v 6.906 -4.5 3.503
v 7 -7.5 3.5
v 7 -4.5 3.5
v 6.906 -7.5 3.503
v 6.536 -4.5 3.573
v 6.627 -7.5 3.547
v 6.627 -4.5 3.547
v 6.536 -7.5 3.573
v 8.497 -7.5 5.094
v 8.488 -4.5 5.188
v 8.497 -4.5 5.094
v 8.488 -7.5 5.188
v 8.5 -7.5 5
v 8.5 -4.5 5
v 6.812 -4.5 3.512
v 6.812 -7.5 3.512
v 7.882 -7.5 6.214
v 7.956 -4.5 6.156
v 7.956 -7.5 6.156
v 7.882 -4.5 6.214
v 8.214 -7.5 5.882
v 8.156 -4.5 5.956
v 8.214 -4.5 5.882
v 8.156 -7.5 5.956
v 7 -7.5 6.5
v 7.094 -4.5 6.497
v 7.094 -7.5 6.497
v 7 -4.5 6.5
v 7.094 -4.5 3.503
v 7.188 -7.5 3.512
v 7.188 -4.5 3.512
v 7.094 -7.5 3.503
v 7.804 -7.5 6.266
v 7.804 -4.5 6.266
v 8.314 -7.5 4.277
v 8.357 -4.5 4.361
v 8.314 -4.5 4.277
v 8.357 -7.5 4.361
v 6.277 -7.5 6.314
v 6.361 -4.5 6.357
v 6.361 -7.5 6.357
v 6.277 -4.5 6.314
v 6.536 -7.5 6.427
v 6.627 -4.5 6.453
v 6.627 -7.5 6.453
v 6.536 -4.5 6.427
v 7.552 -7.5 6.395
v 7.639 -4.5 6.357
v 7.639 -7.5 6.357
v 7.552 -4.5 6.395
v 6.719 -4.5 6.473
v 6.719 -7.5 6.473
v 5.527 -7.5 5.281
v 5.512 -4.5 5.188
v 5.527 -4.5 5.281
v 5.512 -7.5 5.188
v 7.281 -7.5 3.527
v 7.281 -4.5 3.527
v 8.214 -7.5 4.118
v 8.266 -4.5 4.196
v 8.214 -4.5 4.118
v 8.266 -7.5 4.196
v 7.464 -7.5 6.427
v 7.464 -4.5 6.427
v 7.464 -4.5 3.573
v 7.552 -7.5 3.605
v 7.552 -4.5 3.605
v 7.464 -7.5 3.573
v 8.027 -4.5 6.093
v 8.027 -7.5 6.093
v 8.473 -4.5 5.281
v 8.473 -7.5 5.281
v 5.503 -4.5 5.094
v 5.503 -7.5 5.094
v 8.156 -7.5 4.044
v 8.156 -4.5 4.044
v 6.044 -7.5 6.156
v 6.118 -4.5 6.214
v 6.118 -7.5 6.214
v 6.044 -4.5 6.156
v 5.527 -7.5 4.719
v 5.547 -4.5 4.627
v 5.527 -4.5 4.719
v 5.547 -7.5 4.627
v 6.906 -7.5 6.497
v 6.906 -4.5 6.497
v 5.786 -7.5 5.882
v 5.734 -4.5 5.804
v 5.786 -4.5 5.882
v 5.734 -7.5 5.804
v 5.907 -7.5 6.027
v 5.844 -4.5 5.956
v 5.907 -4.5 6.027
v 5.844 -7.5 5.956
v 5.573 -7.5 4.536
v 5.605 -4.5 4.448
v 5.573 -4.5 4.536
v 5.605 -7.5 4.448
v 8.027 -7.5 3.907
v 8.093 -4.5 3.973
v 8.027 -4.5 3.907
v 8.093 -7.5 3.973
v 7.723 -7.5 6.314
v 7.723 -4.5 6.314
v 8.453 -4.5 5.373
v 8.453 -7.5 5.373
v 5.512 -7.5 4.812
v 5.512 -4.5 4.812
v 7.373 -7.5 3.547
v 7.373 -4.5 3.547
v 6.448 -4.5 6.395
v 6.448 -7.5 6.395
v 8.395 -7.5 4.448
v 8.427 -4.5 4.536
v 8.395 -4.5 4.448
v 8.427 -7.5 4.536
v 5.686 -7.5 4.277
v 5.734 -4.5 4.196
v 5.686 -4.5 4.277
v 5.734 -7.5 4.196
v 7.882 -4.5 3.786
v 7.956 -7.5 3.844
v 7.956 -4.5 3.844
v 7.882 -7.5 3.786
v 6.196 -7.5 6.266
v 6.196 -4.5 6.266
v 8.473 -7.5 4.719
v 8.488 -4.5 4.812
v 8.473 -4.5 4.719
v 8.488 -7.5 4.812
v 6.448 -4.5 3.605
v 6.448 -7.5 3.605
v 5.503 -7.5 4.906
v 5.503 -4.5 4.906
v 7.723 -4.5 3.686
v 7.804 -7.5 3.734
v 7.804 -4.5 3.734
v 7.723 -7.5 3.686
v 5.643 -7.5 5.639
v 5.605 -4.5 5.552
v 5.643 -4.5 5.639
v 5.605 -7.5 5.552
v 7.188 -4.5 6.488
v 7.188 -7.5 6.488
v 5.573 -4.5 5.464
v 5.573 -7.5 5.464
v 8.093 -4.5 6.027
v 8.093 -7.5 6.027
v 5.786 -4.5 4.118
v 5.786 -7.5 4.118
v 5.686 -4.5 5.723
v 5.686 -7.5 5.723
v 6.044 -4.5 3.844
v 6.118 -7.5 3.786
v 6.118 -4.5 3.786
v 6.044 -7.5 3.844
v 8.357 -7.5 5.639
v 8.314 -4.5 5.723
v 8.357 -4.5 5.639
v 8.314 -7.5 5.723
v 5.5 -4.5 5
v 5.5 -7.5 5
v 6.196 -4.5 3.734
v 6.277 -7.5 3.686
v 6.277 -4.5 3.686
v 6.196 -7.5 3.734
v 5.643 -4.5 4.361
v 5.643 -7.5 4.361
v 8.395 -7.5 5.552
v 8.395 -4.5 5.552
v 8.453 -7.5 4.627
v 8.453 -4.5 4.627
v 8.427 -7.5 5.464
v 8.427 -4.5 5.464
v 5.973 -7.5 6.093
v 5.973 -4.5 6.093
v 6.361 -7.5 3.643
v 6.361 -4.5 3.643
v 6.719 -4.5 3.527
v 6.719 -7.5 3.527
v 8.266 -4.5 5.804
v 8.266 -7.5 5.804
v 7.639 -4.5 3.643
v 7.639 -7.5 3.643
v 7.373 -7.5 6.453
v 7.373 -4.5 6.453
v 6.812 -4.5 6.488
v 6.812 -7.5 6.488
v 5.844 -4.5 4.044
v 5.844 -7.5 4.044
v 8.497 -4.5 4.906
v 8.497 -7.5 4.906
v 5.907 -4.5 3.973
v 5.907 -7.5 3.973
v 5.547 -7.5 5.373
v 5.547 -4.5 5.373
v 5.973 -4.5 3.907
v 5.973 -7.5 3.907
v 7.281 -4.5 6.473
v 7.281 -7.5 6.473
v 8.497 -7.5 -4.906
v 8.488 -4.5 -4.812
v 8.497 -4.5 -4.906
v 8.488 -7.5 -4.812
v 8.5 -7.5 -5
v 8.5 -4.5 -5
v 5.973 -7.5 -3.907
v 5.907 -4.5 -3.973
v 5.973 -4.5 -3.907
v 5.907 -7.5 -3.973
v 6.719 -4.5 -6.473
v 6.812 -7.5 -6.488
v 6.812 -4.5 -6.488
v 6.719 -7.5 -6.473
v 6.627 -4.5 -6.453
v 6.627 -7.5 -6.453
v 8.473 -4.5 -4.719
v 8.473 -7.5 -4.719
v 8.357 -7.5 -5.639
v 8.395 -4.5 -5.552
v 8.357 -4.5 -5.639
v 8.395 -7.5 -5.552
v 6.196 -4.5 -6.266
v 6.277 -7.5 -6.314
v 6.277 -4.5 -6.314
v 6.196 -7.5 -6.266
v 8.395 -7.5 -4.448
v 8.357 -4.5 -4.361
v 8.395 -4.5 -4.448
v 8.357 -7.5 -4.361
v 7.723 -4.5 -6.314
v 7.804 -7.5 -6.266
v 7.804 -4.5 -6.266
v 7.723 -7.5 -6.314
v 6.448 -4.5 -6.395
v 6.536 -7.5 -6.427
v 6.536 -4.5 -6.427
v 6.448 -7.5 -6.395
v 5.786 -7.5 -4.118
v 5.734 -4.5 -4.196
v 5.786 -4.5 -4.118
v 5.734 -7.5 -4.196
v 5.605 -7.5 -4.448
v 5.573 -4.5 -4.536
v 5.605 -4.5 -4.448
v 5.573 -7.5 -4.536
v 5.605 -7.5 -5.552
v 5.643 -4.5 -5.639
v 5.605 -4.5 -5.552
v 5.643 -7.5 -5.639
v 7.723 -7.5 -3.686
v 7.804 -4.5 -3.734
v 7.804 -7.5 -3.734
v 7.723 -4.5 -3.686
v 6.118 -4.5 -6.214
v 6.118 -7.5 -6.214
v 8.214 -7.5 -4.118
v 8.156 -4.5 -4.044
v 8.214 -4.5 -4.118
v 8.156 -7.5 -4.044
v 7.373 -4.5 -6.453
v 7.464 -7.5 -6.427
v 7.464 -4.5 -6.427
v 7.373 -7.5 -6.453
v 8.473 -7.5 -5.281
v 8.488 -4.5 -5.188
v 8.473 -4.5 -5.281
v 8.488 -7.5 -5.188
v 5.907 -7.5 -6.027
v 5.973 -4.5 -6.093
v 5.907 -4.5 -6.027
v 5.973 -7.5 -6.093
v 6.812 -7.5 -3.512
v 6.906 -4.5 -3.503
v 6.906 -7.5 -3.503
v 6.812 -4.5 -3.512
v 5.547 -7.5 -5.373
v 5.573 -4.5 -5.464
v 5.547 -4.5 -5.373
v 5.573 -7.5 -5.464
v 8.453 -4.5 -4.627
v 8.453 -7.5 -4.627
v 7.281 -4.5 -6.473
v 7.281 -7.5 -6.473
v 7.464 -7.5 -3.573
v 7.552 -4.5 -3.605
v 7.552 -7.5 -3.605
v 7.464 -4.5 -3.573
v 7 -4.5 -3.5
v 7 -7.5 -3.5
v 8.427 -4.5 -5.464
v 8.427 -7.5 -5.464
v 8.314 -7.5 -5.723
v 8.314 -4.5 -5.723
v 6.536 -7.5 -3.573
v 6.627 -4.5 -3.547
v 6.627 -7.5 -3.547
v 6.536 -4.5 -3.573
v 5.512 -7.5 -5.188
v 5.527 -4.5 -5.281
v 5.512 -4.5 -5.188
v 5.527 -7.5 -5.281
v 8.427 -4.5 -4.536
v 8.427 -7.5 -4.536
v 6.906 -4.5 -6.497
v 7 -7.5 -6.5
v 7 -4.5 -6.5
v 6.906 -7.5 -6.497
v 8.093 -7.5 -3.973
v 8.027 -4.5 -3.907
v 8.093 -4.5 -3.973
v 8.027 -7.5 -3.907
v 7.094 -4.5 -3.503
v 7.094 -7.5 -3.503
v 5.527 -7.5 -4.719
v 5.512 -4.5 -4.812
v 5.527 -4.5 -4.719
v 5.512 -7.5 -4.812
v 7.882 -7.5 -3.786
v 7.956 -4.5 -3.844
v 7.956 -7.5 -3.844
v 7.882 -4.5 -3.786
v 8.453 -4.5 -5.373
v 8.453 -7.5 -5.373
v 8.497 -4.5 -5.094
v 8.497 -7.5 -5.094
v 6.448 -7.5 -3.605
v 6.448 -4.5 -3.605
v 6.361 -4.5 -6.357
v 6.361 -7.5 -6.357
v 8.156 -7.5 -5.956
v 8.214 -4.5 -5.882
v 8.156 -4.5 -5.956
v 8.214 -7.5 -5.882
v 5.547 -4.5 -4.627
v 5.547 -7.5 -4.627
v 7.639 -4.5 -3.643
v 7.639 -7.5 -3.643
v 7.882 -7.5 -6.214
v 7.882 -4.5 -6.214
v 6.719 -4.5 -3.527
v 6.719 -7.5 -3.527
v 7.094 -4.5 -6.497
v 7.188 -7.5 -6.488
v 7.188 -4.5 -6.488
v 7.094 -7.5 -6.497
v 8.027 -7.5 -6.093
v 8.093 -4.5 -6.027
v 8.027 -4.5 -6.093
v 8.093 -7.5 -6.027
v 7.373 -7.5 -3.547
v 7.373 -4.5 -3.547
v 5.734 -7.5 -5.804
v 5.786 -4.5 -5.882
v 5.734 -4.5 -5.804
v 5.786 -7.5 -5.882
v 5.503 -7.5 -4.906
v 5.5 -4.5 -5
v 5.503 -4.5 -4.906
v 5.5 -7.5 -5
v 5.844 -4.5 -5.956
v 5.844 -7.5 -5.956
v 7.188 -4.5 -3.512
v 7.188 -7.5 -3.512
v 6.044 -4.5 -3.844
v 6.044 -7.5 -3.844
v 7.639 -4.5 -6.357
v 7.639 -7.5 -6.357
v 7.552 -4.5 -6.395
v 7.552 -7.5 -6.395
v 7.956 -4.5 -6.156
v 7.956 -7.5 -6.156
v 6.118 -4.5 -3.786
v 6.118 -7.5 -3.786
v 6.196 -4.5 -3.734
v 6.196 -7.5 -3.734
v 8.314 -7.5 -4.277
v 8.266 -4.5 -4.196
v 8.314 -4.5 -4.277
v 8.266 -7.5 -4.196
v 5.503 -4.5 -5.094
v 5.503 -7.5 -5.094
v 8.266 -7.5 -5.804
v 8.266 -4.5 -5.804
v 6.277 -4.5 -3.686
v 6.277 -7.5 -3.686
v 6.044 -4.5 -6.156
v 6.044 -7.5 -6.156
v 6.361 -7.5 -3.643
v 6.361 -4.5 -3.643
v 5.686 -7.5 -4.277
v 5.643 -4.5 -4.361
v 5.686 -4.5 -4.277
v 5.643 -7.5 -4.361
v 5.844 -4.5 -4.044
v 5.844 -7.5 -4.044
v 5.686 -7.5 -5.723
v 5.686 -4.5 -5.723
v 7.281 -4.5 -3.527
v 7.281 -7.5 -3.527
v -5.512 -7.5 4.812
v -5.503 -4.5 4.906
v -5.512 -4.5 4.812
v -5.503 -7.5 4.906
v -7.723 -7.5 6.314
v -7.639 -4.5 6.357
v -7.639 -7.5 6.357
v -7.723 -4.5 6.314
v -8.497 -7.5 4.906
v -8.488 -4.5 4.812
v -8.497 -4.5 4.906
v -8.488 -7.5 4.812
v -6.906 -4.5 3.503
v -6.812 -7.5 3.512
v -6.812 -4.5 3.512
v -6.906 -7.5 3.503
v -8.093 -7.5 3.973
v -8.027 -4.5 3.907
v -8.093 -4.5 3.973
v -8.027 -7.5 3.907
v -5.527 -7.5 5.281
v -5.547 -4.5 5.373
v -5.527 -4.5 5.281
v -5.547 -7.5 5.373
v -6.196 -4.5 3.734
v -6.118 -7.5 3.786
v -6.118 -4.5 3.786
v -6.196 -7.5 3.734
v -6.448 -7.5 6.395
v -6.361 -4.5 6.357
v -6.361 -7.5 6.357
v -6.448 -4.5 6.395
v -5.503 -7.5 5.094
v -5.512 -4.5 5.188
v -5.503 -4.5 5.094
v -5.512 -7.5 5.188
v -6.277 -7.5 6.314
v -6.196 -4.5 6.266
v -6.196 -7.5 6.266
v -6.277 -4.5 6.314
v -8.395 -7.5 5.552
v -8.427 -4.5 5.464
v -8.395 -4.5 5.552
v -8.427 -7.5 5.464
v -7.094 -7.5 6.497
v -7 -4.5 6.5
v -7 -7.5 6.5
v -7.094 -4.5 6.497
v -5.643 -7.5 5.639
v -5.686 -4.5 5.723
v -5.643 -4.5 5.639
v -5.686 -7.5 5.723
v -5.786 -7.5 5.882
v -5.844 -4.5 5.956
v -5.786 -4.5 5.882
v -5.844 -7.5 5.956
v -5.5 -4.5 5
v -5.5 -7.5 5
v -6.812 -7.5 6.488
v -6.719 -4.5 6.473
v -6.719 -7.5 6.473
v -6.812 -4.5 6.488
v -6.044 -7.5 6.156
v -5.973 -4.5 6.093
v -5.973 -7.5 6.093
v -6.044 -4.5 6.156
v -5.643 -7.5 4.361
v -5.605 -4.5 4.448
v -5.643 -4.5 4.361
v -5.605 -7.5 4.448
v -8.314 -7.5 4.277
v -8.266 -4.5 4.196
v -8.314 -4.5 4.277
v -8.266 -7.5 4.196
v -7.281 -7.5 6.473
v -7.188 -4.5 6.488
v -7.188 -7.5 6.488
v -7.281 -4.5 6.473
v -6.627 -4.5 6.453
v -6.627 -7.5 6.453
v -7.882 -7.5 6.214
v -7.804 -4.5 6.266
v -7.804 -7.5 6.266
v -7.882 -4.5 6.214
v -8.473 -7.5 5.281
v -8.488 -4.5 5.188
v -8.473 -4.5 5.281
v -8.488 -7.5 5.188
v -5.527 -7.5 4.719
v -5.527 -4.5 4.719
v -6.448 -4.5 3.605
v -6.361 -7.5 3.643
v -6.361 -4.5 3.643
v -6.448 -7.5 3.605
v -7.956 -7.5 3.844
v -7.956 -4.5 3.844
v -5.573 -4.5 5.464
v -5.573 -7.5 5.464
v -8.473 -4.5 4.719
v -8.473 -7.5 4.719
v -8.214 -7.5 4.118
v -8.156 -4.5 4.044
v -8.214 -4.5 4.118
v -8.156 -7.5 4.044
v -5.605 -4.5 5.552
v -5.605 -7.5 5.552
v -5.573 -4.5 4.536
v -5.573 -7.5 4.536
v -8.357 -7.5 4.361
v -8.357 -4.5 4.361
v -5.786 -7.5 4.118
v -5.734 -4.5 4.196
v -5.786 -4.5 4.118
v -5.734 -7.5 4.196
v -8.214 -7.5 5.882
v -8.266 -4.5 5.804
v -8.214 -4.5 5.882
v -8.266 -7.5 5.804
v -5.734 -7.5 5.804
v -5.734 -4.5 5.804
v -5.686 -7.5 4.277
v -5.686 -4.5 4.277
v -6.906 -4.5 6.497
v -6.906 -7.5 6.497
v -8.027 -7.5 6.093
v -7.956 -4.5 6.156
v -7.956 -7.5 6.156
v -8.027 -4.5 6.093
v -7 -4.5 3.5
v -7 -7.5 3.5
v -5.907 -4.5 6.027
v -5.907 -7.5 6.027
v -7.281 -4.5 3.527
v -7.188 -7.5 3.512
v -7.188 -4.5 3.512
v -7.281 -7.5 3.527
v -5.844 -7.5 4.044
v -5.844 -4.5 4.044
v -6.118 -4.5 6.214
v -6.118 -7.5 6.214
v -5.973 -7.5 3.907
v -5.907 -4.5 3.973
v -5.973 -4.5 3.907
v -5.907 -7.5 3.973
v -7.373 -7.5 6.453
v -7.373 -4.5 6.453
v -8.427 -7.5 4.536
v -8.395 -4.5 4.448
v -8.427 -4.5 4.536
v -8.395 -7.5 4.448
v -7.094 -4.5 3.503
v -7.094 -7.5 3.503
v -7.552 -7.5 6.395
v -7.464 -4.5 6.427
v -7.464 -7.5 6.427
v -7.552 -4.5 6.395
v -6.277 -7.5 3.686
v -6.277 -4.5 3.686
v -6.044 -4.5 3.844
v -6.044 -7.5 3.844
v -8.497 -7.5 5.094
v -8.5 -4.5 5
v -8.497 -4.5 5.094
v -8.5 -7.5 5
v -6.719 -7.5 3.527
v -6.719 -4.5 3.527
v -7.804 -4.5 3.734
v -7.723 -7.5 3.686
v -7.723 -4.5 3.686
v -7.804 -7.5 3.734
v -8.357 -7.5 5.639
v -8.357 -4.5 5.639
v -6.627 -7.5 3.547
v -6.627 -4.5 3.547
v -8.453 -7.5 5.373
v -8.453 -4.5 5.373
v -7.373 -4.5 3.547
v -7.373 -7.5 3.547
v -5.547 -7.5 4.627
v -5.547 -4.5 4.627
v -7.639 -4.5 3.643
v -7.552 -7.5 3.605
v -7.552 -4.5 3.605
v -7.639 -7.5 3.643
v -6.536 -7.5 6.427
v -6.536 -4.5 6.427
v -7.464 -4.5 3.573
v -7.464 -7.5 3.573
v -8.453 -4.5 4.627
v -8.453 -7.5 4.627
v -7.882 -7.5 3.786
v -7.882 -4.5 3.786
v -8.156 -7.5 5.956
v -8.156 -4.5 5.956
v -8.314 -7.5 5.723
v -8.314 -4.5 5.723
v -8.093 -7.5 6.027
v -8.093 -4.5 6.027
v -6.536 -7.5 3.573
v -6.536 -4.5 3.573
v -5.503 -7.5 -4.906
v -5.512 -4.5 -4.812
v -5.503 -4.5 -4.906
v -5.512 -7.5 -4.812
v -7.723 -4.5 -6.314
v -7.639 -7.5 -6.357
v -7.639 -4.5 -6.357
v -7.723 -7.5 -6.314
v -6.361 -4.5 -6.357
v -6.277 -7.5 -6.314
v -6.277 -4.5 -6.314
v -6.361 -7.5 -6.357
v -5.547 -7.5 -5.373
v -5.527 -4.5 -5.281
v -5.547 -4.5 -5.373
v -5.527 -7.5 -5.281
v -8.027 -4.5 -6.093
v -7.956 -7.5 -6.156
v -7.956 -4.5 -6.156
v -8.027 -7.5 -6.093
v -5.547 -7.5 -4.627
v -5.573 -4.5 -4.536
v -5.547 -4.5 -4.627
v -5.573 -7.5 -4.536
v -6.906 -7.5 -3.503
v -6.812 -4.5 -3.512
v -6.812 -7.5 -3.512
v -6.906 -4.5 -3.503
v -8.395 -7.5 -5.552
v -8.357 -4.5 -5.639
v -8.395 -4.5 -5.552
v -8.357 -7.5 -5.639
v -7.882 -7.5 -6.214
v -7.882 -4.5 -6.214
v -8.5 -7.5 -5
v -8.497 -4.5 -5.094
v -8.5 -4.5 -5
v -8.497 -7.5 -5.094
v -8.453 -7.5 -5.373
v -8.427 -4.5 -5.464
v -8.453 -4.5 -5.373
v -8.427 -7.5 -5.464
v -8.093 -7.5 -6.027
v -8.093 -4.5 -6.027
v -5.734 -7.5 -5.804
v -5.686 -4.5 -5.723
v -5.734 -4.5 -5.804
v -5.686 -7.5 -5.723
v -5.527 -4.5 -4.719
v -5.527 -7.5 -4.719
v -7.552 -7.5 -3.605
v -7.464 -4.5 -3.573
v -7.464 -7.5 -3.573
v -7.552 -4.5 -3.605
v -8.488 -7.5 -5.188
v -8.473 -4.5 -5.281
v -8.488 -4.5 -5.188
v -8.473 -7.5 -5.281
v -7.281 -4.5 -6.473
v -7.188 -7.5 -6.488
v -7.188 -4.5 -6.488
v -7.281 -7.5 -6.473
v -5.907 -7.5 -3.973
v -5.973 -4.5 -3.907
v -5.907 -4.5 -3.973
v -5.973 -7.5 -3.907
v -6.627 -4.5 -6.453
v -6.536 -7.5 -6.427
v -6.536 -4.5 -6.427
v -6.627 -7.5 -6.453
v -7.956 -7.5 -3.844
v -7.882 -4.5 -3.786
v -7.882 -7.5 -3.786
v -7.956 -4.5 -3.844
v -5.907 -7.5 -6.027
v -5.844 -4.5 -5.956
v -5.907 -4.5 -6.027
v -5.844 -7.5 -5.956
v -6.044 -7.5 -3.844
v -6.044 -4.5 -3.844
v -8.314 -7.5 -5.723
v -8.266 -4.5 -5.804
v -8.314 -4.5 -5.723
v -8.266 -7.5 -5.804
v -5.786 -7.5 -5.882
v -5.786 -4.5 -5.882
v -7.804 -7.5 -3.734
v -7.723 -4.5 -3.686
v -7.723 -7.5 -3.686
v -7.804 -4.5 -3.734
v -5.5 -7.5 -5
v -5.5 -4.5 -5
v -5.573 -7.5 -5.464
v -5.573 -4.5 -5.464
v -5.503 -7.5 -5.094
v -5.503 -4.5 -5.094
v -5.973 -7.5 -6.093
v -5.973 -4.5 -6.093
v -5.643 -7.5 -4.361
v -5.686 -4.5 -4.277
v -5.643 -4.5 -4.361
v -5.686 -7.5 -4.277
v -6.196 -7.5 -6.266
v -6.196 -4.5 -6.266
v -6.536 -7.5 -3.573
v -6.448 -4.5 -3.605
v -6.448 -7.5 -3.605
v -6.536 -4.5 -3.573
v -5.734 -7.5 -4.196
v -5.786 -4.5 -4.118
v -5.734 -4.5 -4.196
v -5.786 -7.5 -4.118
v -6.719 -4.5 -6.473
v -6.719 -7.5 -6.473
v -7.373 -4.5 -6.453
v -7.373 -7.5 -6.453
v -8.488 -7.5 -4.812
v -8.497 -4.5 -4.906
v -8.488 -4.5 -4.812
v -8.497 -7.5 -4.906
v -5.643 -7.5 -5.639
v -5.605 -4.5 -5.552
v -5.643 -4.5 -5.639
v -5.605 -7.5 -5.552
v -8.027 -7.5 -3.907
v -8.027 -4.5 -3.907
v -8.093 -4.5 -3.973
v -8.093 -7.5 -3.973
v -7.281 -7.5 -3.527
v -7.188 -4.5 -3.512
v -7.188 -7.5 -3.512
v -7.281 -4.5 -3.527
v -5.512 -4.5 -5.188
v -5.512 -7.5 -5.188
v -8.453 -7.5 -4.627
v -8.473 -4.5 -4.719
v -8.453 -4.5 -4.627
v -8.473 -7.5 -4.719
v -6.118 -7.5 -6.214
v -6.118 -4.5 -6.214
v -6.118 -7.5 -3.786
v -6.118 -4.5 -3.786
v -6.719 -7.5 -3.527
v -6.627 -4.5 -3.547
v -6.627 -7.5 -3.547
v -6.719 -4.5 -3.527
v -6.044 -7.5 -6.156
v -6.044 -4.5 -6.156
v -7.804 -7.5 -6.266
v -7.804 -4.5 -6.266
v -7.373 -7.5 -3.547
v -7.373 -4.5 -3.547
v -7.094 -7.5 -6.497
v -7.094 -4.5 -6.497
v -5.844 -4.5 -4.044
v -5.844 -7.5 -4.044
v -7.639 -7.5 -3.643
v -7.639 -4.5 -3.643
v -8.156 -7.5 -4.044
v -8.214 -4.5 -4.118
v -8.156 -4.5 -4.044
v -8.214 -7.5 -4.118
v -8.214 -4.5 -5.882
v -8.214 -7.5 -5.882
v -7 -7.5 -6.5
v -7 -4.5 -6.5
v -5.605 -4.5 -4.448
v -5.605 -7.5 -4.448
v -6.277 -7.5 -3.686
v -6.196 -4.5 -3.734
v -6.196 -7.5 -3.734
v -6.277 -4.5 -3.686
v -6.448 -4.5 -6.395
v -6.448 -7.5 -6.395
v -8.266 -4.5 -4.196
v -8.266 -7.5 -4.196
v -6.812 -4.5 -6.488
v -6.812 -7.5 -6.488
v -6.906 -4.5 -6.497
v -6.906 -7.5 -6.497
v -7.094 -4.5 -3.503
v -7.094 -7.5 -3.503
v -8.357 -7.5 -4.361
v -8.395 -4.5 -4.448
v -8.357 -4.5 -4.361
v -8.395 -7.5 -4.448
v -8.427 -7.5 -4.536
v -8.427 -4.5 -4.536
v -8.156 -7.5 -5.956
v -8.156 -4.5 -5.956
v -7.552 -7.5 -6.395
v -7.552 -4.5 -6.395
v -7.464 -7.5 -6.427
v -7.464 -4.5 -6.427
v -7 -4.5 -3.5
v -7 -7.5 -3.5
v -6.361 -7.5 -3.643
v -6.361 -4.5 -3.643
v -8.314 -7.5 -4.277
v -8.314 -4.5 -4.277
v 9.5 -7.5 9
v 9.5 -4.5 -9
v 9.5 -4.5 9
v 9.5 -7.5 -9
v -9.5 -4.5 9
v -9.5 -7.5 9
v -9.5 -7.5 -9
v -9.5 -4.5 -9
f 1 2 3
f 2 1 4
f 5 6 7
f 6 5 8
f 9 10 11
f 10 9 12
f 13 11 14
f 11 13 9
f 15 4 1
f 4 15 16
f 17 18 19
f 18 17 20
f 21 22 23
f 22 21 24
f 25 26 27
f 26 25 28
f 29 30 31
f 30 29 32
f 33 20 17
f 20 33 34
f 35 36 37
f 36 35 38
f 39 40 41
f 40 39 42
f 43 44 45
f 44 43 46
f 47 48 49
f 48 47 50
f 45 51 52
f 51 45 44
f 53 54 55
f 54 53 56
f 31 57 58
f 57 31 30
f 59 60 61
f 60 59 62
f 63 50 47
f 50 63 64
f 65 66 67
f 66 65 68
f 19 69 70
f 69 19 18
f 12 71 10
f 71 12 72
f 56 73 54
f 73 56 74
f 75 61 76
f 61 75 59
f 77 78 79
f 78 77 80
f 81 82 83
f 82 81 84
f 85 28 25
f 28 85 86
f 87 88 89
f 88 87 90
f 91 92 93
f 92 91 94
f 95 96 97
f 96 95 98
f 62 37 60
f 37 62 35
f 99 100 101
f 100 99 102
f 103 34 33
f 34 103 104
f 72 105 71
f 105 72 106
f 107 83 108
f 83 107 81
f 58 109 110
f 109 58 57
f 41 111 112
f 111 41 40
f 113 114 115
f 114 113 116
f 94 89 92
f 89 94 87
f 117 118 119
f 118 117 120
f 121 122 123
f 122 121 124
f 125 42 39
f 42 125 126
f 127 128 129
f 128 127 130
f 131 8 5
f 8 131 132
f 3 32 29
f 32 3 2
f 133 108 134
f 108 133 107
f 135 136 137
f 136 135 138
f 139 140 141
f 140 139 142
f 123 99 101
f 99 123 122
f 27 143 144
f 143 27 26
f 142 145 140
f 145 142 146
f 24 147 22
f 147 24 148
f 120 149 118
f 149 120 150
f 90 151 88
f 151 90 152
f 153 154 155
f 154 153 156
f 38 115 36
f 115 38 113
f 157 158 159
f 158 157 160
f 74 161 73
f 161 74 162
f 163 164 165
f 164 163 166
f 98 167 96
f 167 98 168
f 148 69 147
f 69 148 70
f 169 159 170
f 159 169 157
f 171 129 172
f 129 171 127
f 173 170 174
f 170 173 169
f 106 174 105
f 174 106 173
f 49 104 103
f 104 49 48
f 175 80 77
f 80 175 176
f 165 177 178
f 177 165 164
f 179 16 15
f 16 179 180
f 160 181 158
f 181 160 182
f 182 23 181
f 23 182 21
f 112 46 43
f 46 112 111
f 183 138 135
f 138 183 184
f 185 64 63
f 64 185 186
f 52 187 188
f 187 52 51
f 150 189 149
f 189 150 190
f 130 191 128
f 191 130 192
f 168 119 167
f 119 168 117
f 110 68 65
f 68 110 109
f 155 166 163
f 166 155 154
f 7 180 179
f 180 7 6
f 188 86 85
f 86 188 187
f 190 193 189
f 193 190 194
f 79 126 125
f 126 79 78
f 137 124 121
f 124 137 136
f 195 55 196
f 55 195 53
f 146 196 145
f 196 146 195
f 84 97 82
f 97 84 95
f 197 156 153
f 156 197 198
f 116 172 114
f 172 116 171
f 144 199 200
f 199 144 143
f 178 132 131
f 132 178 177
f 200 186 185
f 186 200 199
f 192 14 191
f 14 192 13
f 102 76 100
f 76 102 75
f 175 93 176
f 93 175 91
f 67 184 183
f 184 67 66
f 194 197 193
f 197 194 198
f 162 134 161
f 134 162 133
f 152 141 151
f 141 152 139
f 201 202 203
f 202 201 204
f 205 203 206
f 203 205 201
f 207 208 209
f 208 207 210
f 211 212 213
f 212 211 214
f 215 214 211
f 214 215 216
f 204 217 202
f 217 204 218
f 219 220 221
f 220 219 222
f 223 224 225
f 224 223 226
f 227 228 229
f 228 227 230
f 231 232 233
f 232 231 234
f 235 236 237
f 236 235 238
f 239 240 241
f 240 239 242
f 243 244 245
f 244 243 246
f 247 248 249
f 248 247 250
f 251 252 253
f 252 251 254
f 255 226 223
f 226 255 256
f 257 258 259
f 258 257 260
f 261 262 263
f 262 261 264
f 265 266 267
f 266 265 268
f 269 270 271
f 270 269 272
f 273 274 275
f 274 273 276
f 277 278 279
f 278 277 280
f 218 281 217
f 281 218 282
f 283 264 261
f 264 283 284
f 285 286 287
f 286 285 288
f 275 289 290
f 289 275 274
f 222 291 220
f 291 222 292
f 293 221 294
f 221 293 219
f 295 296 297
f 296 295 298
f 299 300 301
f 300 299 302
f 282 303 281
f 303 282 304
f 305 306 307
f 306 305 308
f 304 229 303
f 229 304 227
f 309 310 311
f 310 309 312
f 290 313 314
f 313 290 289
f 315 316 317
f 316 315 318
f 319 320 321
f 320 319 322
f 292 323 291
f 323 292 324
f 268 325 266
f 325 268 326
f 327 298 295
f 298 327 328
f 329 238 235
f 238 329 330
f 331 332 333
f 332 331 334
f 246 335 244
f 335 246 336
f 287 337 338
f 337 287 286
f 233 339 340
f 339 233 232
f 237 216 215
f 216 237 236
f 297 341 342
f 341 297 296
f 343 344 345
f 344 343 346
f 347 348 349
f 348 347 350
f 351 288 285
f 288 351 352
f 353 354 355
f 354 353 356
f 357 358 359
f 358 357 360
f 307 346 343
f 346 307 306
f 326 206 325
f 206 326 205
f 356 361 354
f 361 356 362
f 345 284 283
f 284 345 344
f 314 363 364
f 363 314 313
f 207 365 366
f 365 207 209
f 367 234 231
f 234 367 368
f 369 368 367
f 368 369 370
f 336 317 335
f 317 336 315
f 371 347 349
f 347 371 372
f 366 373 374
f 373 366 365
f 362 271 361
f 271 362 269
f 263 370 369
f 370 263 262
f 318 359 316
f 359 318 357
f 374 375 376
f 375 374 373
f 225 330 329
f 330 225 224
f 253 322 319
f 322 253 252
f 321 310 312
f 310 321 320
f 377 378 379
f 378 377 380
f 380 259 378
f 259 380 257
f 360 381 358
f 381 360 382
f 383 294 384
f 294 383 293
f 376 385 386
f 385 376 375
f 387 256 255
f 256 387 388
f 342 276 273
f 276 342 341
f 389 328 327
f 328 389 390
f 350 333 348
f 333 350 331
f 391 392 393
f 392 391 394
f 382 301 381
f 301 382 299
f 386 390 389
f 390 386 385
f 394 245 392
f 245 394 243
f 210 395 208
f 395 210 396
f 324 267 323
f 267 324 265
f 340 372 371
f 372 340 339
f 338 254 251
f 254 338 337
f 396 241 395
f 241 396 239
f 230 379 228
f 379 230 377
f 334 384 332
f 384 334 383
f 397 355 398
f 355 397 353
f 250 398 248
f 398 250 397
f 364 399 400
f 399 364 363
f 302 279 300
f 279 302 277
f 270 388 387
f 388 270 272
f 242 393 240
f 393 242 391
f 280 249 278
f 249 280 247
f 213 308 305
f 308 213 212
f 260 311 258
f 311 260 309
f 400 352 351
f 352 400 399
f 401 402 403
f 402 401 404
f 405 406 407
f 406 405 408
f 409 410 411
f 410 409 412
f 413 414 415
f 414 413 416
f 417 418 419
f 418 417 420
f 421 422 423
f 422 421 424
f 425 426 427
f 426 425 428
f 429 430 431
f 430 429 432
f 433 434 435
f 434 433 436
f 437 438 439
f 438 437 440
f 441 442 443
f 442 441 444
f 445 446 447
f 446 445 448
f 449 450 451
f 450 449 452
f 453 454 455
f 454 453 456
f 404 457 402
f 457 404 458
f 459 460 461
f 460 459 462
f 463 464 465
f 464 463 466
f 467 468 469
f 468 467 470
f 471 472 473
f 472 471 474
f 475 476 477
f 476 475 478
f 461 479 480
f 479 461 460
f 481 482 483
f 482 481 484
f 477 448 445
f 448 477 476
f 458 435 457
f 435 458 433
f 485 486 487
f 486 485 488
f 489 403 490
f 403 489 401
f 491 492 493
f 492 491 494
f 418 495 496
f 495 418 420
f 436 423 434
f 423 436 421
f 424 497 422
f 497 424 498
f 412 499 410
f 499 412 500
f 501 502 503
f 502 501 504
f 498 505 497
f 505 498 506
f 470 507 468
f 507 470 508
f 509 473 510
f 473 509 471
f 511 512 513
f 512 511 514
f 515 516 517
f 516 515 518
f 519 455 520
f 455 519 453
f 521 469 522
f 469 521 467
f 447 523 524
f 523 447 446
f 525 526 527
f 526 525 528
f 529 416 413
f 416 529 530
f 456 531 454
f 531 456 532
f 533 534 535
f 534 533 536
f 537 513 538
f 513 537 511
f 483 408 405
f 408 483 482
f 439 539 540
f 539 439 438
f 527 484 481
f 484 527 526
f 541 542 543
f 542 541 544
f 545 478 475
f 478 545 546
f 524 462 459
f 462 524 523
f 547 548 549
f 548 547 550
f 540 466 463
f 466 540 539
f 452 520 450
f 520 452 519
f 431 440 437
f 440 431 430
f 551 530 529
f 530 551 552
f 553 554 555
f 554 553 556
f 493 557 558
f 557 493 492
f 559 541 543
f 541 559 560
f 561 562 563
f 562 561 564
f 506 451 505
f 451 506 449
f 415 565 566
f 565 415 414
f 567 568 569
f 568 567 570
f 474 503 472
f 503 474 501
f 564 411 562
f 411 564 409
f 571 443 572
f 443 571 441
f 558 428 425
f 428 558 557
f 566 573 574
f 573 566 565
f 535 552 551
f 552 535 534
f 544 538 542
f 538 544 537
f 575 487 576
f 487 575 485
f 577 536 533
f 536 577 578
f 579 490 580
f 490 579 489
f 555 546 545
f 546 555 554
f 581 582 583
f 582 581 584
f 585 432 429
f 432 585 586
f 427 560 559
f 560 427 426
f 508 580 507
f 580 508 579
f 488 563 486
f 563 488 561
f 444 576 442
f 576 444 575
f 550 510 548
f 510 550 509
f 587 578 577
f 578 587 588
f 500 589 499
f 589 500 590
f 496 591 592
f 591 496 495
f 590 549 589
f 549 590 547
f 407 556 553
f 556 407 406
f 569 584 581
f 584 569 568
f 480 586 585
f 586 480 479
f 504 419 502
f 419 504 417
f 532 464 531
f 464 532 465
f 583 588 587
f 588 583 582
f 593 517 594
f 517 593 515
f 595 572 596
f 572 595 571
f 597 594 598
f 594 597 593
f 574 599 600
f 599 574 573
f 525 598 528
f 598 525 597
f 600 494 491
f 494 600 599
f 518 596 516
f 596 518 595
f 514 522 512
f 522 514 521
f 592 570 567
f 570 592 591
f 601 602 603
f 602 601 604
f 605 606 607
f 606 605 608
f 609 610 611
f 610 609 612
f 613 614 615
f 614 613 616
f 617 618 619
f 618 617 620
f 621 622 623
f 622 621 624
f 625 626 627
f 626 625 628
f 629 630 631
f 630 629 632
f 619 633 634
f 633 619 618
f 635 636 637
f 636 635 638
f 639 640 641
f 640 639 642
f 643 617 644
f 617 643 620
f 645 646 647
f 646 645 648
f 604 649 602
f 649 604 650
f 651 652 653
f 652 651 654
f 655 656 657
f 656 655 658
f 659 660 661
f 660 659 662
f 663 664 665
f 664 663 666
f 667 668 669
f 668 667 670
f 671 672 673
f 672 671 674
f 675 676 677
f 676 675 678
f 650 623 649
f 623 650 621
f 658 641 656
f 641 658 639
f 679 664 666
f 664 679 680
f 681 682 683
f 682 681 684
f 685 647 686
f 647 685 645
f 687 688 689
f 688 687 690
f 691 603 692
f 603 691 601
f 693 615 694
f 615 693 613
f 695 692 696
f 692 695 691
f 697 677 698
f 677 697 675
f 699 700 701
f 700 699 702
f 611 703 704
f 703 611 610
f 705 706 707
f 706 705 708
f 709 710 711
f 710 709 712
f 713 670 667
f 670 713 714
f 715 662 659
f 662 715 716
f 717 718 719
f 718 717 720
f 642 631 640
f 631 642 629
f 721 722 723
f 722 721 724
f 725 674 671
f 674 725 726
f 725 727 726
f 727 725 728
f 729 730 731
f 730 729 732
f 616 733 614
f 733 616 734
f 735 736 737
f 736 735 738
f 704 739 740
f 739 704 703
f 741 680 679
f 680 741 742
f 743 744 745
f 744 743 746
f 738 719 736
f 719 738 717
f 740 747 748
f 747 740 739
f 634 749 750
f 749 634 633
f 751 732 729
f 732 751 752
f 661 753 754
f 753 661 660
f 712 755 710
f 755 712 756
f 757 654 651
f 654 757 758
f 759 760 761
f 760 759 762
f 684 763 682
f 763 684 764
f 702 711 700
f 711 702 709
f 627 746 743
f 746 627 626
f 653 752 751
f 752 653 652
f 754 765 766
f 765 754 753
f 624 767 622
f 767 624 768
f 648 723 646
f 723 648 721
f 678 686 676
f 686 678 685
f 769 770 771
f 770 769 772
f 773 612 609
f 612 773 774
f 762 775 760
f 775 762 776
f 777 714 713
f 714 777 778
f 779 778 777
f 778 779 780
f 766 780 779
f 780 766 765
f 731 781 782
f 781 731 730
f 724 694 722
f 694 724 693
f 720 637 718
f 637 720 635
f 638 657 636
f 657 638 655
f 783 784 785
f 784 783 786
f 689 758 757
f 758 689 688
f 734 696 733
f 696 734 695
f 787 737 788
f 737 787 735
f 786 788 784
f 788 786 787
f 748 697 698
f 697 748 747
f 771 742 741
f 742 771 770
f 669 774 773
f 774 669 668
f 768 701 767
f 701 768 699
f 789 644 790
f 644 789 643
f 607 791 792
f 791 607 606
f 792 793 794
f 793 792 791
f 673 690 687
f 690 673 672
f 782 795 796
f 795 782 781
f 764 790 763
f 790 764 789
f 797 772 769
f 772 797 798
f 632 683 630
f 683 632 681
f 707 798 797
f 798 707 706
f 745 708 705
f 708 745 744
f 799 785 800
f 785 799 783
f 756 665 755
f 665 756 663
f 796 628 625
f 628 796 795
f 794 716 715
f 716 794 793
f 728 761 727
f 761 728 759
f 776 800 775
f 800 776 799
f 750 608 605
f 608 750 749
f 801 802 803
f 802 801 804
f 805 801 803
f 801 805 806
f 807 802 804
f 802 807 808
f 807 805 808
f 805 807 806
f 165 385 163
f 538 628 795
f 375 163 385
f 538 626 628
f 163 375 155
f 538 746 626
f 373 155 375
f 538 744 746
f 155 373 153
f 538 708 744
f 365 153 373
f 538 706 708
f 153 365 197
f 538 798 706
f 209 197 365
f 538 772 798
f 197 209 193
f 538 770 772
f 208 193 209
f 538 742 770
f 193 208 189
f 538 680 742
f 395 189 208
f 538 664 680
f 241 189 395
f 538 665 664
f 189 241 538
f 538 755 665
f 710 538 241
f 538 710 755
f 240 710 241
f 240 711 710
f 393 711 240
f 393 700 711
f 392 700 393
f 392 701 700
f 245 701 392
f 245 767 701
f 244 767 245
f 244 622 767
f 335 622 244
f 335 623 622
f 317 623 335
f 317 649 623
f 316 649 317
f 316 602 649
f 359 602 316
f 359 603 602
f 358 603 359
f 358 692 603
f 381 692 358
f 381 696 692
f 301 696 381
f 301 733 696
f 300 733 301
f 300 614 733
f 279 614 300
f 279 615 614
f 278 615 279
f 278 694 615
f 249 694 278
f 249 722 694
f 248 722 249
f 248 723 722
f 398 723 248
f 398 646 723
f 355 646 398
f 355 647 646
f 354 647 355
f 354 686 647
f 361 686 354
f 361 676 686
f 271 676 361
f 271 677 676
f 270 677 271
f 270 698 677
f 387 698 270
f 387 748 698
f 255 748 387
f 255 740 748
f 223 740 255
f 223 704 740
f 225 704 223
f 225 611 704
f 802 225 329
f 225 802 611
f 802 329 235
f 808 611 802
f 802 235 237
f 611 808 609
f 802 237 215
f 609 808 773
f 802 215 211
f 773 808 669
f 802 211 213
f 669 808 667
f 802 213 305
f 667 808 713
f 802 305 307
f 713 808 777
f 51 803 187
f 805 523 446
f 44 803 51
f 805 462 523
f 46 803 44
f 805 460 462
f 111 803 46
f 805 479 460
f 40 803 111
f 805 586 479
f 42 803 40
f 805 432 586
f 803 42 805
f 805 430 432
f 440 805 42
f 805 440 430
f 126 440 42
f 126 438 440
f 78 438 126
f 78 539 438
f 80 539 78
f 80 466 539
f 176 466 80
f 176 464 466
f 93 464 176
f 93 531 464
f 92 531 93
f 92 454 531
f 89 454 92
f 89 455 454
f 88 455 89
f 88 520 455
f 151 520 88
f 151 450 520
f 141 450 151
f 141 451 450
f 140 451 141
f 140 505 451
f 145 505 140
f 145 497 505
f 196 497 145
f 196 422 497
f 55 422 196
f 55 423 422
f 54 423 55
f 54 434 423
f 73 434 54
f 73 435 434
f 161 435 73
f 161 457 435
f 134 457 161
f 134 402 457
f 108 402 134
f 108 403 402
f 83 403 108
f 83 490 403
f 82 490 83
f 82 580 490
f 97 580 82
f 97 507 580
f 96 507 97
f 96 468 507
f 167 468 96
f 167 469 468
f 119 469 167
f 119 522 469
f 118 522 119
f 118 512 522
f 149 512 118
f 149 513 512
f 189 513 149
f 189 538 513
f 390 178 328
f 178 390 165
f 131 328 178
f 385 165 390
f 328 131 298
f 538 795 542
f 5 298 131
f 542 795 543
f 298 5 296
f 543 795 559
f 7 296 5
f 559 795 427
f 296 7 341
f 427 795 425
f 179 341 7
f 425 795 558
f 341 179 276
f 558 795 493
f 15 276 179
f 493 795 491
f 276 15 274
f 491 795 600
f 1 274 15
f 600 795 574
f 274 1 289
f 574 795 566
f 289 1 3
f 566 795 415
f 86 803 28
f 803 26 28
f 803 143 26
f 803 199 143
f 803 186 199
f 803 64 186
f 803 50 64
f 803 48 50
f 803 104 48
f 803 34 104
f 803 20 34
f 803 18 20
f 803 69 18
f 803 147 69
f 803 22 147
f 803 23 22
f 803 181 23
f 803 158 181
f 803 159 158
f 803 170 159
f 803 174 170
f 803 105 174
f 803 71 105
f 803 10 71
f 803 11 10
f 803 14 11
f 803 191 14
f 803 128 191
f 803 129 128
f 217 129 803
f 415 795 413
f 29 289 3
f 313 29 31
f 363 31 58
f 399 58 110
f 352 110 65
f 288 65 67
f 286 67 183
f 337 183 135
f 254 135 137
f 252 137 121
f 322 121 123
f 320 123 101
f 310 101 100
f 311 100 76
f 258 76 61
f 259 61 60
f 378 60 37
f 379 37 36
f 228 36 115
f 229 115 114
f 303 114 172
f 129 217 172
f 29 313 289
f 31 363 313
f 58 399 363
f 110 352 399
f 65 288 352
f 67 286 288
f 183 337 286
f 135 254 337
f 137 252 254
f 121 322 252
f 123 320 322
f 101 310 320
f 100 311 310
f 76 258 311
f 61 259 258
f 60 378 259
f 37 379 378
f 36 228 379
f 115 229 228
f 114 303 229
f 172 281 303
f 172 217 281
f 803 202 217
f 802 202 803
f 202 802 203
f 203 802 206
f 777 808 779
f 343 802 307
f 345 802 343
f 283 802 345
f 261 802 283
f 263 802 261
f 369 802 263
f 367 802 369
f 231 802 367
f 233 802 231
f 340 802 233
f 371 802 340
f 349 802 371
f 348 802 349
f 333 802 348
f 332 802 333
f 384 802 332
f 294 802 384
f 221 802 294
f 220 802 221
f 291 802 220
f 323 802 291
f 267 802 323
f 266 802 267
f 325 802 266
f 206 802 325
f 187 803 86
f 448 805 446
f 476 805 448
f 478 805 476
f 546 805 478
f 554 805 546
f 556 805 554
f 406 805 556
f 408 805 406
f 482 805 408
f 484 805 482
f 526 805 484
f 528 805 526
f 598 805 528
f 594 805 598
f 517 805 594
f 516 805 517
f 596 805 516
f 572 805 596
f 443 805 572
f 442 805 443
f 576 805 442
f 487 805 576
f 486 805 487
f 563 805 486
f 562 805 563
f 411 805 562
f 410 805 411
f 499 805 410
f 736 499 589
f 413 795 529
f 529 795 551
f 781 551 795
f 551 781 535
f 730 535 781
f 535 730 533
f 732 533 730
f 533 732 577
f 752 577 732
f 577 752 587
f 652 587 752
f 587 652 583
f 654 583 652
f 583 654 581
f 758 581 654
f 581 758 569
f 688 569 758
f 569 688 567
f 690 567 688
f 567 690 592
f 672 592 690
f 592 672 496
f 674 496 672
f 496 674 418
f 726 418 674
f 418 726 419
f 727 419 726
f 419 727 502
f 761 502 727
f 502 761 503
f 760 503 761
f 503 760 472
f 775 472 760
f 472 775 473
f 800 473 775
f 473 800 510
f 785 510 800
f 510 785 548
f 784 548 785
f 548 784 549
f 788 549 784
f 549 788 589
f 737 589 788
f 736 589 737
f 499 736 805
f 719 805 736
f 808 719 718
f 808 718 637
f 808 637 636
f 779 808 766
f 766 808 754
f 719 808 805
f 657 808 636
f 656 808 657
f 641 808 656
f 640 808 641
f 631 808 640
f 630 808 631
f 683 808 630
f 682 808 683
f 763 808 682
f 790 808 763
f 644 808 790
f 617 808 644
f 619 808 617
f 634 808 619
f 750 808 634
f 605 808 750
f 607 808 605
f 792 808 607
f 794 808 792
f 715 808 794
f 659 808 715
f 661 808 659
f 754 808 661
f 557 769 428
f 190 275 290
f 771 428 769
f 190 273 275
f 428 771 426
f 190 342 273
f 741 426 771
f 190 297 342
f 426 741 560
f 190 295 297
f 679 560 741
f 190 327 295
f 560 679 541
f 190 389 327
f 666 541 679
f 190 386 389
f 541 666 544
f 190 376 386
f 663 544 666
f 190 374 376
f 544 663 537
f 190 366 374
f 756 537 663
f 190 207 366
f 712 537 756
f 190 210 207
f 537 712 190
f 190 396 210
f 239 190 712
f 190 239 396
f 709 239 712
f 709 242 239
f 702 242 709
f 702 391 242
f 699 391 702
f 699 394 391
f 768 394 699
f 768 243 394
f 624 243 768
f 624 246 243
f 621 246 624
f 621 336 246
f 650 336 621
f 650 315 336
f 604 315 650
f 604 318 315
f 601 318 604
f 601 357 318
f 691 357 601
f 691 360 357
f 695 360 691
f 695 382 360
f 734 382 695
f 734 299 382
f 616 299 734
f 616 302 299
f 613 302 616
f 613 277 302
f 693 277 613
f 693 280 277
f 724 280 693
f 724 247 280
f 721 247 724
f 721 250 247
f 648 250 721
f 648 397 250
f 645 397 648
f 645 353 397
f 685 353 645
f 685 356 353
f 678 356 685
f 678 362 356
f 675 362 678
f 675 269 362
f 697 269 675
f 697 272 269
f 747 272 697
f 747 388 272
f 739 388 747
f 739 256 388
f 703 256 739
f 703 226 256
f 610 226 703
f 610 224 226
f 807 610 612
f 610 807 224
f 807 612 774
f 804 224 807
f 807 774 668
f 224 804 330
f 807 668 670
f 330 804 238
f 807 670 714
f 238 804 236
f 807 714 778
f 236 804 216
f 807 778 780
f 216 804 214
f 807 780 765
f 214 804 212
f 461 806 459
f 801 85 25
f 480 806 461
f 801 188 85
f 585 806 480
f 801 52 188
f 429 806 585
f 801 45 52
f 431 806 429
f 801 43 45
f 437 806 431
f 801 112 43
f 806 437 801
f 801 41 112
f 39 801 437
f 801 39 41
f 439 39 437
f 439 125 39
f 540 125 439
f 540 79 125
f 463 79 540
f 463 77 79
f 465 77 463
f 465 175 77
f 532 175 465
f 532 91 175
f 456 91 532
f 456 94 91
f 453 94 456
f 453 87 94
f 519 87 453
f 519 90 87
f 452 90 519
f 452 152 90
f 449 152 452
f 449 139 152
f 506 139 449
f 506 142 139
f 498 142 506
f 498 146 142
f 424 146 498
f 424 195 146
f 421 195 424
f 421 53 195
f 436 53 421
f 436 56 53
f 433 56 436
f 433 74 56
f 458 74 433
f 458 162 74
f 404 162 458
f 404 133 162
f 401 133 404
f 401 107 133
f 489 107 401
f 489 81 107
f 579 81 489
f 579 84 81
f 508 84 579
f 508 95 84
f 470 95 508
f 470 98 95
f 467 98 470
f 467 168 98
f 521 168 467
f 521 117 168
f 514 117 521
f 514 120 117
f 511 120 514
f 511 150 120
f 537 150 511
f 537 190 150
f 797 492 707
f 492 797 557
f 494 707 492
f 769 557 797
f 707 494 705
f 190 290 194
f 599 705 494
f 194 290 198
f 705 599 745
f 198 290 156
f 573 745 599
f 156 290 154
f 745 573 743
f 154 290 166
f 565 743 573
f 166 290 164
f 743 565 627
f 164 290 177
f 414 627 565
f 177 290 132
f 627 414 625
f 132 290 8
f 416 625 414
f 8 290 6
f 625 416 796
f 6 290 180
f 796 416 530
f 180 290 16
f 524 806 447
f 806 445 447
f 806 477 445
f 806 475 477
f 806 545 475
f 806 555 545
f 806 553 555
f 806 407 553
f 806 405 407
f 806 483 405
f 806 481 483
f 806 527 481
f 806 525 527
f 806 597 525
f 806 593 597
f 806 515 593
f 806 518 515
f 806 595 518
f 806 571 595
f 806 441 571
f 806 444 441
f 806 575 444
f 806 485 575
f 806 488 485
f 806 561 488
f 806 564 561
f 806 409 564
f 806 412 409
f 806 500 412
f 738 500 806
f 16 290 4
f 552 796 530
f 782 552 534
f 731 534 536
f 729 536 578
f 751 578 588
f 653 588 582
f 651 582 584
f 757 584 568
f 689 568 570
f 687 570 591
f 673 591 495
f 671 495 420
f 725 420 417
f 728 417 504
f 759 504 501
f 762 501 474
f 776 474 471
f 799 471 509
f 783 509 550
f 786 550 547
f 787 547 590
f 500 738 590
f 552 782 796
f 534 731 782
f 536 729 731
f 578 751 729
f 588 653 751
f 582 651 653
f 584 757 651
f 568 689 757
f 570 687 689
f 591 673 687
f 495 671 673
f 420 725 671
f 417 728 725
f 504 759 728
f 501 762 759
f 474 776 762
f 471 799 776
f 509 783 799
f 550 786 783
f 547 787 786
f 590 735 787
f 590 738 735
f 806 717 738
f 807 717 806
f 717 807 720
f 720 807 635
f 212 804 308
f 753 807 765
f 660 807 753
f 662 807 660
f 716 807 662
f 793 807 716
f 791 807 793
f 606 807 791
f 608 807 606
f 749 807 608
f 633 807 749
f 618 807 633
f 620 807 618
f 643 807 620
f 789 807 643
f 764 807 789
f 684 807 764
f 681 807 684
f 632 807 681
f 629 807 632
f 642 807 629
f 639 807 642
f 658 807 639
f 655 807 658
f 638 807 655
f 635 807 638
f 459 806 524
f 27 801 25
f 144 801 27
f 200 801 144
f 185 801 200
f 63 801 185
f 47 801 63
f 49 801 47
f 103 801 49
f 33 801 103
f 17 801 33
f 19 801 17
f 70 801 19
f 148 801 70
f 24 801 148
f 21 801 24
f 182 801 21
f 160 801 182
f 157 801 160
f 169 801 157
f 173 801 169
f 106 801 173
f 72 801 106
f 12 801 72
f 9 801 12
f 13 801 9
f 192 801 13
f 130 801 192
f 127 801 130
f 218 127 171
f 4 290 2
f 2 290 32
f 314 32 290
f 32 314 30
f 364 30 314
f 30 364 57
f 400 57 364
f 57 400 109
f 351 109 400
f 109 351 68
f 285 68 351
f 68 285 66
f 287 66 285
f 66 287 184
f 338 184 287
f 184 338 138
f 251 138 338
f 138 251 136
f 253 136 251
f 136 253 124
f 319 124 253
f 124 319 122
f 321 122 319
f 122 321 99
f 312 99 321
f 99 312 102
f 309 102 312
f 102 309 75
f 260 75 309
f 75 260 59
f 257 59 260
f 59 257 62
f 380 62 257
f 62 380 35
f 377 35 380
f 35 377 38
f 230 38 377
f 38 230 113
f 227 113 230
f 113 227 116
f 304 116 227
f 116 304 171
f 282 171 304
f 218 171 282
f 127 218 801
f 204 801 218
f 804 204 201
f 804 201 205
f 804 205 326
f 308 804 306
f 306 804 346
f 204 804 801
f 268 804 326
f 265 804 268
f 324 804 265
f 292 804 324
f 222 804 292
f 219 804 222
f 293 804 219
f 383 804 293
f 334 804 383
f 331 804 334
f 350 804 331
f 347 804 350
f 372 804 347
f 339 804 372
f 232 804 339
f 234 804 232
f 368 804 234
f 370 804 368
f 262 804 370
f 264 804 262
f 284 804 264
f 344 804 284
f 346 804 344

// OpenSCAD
difference(){
	union(){

        translate([-9.5,-7.5,-9]){
            cube([19,3,18], center=false);
        }

        
        

	}
	union() {


        translate([7,20,5]){
            rotate([90,0,0]){
                color("blue")
                cylinder(h=100, r=1.5, $fn=100, center=false);
            }
        }
        translate([7,20,-5]){
            rotate([90,0,0]){
                color("blue")
                cylinder(h=100, r=1.5, $fn=100, center=false);
            }
        }
        translate([-7,20,5]){
            rotate([90,0,0]){
                color("blue")
                cylinder(h=100, r=1.5, $fn=100, center=false);
            }
        }
        translate([-7,20,-5]){
            rotate([90,0,0]){
                color("blue")
                cylinder(h=100, r=1.5, $fn=100, center=false);
            }
        }

	}
}
